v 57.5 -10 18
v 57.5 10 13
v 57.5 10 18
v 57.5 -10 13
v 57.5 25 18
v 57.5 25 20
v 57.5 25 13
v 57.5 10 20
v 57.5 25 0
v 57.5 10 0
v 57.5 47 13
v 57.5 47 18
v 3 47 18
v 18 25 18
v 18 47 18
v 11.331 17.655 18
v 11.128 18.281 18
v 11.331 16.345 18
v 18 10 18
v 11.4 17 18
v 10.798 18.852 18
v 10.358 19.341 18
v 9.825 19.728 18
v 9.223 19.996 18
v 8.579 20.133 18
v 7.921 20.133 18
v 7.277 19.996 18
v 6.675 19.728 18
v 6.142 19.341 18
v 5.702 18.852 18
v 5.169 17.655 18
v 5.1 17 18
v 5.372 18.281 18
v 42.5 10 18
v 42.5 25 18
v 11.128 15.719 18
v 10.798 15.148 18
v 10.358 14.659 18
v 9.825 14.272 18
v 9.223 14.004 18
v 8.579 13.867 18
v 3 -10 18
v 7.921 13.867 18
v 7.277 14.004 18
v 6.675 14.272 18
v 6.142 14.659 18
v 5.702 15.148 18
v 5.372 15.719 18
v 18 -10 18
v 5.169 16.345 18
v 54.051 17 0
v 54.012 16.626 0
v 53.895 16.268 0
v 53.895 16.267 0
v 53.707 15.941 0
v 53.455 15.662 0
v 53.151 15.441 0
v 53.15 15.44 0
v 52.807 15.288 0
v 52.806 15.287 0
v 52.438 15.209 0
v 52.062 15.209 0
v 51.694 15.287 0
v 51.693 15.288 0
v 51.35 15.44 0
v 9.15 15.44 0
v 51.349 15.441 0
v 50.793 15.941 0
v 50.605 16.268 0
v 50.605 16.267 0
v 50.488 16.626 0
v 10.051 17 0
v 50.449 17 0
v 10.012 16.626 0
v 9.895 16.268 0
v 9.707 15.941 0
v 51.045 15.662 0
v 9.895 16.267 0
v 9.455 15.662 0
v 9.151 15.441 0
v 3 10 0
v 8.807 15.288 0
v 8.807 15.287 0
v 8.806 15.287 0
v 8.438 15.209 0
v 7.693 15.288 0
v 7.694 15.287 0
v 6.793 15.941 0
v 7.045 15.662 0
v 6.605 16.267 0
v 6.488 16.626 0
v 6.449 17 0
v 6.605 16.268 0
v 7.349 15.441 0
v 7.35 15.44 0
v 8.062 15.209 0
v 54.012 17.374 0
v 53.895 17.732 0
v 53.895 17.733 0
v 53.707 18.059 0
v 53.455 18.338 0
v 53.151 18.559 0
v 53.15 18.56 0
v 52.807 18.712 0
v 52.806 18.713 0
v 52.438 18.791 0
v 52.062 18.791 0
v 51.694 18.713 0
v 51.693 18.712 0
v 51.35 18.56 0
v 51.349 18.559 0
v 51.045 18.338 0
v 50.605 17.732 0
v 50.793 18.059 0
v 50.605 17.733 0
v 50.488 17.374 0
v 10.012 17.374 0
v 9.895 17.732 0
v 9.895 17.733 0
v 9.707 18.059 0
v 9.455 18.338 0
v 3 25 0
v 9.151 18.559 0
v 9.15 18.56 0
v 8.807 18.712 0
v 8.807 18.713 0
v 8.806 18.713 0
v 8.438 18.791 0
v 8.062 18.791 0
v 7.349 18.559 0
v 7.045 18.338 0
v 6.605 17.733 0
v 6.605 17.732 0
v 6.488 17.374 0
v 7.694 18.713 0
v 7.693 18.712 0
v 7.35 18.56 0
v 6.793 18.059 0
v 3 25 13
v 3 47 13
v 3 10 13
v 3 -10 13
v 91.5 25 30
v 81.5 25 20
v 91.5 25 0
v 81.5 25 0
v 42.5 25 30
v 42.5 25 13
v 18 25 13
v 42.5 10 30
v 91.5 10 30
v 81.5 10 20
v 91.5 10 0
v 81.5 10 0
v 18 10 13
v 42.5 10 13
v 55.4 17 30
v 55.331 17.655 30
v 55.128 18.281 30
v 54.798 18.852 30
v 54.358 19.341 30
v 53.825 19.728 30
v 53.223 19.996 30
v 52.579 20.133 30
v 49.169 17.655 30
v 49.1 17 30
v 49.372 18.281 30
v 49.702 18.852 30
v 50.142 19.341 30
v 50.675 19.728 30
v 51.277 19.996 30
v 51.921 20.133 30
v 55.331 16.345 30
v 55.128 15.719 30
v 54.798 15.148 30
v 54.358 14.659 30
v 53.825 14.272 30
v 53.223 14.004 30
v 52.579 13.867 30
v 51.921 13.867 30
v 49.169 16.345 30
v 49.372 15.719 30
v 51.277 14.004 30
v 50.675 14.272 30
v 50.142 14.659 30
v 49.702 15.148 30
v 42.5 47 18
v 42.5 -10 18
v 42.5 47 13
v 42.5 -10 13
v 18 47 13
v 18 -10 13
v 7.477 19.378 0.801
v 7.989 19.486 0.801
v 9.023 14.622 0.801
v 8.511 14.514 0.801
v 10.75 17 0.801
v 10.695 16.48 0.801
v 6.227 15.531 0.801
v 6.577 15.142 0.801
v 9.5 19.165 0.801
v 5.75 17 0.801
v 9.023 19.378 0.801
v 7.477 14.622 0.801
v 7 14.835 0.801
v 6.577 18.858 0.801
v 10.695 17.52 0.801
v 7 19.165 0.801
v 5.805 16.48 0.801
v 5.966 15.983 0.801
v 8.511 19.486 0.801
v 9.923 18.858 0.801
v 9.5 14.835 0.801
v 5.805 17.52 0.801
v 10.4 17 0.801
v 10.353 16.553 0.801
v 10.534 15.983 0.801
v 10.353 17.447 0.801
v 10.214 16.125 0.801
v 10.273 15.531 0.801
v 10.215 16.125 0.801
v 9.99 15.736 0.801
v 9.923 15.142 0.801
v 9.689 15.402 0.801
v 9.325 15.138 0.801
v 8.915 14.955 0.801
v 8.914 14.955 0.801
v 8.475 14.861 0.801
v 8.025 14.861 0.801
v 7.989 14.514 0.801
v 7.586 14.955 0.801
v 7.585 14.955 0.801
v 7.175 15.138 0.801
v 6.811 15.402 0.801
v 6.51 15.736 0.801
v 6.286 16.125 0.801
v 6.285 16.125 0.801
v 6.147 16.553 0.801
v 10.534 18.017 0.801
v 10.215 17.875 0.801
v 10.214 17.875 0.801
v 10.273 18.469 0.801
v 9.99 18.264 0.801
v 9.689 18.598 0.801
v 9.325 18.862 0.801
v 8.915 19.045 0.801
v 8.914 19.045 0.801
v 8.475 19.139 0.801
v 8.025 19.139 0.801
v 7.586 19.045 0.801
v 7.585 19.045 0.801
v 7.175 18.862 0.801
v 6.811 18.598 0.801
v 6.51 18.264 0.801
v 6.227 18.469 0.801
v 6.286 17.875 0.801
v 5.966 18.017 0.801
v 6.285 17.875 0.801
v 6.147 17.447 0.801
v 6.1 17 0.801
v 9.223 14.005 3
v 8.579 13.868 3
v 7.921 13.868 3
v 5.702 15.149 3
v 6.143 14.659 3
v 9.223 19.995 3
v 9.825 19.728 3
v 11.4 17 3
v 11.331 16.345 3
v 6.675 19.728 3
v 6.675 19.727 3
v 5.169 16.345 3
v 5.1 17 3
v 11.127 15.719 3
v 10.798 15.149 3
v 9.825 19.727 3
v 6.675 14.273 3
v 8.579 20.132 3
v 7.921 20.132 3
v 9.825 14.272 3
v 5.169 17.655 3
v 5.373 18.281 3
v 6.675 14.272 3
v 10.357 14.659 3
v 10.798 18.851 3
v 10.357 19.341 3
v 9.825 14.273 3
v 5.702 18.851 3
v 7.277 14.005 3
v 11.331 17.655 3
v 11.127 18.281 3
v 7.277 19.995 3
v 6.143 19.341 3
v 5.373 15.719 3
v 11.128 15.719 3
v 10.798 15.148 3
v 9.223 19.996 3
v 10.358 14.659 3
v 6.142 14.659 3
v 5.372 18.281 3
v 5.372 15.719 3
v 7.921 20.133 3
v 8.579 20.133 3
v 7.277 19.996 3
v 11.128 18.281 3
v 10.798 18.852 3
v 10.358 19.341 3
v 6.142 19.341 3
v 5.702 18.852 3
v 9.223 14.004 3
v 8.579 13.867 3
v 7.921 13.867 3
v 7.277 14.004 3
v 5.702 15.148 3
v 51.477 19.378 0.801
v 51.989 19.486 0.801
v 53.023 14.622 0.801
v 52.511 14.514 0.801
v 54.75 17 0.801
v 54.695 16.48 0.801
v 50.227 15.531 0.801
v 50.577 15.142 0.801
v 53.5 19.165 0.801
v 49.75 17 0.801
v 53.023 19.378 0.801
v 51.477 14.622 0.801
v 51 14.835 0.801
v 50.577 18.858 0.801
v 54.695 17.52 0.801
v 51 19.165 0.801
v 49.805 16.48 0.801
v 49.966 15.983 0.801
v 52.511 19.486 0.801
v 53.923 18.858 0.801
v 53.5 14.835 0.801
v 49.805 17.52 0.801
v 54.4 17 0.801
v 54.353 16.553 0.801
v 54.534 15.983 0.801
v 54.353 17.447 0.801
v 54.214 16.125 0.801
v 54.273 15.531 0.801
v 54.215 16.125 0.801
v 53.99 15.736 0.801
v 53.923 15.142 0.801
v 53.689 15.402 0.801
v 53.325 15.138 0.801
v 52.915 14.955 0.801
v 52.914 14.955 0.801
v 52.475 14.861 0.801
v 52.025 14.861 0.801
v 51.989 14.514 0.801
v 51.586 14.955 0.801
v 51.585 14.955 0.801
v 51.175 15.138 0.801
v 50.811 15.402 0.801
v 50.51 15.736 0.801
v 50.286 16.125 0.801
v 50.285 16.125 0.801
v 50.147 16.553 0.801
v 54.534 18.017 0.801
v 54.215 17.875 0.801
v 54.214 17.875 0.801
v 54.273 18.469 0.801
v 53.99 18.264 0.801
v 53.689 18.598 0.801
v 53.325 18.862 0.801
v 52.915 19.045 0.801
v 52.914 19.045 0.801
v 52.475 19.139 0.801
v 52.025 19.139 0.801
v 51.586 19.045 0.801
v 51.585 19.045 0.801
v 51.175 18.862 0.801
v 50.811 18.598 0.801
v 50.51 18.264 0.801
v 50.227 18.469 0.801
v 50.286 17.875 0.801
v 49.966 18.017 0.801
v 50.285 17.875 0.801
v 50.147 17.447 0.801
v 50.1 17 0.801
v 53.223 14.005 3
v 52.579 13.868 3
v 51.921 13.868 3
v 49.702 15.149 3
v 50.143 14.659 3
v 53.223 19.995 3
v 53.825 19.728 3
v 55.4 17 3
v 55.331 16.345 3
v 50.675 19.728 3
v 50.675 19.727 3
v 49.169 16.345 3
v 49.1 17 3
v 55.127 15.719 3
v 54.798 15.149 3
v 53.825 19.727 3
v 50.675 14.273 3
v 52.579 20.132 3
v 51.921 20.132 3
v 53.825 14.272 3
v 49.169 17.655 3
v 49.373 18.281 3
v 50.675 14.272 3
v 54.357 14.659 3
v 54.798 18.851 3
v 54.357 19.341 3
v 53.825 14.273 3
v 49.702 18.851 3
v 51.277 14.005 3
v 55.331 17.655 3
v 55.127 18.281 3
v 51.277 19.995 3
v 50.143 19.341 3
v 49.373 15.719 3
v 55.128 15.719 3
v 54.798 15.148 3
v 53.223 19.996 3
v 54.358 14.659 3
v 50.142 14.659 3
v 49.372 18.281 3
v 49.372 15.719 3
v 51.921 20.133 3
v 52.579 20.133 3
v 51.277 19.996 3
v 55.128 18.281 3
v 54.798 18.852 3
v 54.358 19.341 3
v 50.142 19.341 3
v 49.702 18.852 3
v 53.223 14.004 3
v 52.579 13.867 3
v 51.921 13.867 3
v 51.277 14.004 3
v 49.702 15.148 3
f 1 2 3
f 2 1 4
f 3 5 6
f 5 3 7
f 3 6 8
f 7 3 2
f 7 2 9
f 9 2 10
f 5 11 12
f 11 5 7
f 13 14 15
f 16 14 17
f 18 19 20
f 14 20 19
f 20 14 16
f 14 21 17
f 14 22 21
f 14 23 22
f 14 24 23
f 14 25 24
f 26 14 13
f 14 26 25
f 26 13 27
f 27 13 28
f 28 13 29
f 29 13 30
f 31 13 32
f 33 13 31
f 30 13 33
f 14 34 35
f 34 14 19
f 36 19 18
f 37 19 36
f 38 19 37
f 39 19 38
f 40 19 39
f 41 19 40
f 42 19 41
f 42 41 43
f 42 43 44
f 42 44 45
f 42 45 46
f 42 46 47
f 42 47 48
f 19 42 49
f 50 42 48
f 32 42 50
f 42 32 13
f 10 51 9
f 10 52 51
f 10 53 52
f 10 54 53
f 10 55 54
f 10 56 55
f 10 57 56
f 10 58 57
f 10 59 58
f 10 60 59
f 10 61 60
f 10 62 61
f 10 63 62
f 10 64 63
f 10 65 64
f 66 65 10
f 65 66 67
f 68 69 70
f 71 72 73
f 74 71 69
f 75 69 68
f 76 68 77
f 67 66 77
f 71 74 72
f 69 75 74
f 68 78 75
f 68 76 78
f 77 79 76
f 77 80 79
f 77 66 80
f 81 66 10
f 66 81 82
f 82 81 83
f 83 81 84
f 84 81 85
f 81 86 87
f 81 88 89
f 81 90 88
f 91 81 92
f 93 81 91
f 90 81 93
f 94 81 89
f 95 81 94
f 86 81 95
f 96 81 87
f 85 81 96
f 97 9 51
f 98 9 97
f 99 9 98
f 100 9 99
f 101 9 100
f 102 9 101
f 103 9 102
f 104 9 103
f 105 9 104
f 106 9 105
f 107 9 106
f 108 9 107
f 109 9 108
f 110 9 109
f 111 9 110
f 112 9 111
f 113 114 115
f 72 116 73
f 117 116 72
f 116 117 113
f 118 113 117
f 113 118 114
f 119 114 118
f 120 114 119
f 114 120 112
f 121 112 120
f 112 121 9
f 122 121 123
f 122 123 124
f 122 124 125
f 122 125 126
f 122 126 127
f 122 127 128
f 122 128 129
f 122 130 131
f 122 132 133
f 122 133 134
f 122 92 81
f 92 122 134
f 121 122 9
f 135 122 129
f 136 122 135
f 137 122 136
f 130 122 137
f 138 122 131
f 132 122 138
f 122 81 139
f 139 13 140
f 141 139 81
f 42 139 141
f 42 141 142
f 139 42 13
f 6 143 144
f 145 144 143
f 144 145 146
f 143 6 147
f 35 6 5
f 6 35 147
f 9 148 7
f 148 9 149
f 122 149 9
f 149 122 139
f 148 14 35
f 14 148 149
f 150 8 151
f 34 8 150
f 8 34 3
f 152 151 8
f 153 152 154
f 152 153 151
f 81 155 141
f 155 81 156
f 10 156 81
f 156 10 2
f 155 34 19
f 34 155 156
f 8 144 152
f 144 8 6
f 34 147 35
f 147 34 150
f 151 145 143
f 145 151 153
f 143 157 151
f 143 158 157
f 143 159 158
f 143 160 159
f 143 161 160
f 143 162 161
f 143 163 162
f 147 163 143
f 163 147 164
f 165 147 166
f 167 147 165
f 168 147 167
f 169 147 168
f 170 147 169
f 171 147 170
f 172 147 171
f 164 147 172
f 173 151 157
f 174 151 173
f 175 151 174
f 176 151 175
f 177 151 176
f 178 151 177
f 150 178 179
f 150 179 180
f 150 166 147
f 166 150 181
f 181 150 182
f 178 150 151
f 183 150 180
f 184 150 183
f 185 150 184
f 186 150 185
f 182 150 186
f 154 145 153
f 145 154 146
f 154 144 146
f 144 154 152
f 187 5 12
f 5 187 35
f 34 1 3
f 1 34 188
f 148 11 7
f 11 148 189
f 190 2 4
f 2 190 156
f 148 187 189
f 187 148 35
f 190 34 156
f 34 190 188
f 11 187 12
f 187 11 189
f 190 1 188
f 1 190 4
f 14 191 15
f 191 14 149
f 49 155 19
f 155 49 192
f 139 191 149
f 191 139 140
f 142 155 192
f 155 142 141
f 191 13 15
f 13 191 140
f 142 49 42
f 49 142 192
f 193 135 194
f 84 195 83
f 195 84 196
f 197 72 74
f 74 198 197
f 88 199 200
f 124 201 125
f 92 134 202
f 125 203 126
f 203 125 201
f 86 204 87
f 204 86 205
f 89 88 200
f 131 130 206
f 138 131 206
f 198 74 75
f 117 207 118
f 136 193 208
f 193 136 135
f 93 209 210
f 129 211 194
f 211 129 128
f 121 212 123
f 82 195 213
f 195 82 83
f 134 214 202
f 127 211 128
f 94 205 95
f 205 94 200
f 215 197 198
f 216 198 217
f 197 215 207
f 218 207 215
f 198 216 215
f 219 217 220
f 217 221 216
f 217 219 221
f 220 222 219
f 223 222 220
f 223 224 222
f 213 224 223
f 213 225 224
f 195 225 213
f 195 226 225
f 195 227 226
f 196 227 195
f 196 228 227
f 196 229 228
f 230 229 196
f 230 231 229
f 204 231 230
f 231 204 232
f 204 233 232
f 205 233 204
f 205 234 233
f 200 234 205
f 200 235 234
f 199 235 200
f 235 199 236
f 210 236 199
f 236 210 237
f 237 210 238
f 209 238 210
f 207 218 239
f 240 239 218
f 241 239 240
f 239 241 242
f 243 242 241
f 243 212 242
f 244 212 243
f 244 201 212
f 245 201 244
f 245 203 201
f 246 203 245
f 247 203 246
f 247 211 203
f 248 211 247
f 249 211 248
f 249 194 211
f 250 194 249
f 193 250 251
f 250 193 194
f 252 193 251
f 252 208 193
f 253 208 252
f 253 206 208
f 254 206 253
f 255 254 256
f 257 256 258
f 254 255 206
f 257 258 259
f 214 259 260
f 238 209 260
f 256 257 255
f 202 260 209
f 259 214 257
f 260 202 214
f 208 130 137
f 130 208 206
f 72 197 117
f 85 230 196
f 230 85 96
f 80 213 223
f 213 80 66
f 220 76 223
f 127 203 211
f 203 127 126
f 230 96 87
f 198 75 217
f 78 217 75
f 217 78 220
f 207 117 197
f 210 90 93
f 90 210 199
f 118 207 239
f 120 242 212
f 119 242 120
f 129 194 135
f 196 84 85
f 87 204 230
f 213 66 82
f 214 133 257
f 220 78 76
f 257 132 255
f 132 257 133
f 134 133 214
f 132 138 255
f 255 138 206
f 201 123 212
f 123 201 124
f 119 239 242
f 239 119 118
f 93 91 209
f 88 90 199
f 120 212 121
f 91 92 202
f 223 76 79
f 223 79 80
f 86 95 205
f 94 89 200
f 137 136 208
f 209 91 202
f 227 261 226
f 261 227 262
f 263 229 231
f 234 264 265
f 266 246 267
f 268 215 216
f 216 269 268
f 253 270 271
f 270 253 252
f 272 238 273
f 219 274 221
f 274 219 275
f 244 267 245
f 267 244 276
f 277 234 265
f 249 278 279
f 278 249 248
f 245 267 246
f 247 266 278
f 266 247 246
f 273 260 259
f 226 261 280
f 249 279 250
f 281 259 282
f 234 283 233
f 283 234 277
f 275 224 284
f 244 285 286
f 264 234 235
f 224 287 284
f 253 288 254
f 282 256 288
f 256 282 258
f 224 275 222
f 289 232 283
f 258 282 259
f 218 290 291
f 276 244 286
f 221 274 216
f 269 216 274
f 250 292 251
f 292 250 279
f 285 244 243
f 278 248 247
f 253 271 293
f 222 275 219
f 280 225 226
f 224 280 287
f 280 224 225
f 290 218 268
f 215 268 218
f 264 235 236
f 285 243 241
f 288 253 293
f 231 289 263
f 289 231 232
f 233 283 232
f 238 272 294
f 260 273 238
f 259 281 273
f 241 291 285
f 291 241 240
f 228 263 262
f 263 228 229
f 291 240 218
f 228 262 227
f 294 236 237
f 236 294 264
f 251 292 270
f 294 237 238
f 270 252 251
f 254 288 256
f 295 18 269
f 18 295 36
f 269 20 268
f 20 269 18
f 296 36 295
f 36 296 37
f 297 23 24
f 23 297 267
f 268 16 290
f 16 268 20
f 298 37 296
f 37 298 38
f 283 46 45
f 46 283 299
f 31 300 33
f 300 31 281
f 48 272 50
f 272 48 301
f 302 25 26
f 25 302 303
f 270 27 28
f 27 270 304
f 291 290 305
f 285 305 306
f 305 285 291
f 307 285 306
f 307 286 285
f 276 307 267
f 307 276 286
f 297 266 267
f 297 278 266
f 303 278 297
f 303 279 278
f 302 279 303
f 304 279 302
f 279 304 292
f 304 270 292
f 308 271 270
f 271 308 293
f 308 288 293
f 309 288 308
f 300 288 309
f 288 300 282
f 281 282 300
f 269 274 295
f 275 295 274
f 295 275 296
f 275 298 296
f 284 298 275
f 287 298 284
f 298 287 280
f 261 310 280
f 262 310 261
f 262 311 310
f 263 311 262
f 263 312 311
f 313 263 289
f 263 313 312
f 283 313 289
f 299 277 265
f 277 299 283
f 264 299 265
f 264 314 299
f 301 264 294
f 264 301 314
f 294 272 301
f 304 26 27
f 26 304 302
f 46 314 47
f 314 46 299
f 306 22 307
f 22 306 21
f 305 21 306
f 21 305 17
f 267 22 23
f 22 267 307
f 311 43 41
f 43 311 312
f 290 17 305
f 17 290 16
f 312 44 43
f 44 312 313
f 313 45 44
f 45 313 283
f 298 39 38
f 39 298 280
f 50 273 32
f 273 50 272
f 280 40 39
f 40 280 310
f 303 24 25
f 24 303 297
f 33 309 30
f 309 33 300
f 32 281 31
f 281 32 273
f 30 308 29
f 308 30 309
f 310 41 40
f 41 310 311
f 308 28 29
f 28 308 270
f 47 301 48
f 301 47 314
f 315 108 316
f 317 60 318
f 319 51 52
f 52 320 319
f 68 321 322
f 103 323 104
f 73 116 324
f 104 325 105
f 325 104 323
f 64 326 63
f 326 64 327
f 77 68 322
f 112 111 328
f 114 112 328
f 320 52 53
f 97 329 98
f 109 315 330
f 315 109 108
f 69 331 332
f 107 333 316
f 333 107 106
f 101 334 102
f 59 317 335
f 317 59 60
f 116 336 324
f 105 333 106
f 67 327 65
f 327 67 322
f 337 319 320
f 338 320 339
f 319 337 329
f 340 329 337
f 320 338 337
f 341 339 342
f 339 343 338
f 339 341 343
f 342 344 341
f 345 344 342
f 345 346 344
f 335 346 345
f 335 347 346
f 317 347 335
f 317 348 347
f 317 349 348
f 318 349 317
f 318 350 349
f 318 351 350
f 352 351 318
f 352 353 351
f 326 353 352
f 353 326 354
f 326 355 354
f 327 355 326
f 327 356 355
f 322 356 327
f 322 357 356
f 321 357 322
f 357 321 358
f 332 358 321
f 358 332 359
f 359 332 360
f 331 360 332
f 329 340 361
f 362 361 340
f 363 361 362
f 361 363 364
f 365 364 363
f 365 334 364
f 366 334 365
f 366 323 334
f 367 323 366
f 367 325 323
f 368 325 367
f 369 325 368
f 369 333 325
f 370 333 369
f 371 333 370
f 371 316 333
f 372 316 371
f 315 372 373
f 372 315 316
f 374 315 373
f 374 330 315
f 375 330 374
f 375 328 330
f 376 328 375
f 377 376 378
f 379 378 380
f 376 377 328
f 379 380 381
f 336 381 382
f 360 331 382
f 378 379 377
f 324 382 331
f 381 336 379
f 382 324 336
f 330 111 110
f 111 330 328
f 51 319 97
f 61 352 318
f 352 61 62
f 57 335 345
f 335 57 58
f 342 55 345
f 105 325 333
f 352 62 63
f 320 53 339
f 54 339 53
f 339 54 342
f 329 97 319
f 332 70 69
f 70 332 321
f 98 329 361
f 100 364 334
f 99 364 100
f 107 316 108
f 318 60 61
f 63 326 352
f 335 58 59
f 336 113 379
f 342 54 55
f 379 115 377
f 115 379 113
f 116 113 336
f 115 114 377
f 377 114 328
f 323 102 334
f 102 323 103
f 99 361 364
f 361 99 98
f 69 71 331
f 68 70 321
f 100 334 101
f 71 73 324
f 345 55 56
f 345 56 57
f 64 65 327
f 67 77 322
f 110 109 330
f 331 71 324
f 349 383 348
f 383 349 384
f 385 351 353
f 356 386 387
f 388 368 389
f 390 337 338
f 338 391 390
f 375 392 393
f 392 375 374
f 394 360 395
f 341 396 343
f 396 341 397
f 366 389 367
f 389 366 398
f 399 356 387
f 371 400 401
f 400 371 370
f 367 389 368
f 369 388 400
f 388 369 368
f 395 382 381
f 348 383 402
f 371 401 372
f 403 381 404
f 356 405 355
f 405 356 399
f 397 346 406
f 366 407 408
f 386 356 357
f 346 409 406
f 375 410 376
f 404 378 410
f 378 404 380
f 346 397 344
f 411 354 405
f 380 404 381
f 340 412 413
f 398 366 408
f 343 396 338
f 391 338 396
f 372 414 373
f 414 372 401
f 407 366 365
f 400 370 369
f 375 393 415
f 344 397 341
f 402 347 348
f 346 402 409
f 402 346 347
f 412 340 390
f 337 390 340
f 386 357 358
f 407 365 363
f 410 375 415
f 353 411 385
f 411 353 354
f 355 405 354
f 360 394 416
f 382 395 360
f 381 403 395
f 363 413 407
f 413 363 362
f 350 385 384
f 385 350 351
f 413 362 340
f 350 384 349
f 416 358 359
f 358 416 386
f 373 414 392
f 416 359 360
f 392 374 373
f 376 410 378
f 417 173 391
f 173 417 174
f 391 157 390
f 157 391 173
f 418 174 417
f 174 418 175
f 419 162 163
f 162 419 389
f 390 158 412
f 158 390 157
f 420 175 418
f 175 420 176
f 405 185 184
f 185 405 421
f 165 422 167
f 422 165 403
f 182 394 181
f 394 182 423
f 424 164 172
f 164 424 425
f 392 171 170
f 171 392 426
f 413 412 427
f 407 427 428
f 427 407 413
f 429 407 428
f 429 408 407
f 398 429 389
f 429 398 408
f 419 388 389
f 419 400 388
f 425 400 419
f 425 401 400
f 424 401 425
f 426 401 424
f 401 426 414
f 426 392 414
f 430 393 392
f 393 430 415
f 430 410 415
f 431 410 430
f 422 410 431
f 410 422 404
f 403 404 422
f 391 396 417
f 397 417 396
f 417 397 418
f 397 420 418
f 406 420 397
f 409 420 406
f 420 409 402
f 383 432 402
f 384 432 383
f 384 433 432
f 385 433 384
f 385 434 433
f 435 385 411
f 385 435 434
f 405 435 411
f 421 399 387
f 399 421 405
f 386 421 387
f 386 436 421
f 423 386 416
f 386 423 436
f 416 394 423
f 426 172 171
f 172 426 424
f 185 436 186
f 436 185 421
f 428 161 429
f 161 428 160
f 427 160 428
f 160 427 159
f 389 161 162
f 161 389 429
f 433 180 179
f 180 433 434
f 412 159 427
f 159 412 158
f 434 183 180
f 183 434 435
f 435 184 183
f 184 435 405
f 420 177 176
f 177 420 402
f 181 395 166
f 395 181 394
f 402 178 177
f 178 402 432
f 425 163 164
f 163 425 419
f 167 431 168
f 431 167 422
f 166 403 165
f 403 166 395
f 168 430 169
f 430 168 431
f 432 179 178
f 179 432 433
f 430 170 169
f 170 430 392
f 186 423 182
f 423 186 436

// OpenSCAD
//
// ktCURTAIN1
//
//


gap1 = 0.001;
gap2 = 0.002;

th = 2;
//for A
h = 6.5 + 0.5;
r = (26+0.6)/2;
rr = r + 4/2;
rh = 8/2;

//A();
//B();
//C1();
C2();
//D1();
//D2();

module A()
difference()
{
    union()
    {
        translate([0, 0, h+th/2]) rotate([0, 0, 0,]) cylinder(th/2,  r+rh, r+rh, $fn=100);
        translate([0, 0, h]) rotate([0, 0, 0,]) cylinder(th/2,  r+rh-2.2, r+rh, $fn=100);
        translate([0, 0, 0]) rotate([0, 0, 0,]) cylinder(h,  rr, rr, $fn=100);
        translate([0, 0, -th/2]) rotate([0, 0, 0,]) cylinder(th/2,  r+rh, r+rh-2.2, $fn=100);
        translate([0, 0, -th]) rotate([0, 0, 0,]) cylinder(th/2,  r+rh, r+rh, $fn=100);
    }

    translate([0, 0, -10]) rotate([0, 0, 0,]) cylinder(30, r, r, $fn=100);

    for (i =[0:(360/48):360])
    {
        rotate([0, 0, i,]) translate([r+2, 0, -gap1]) scale([1.4, 1, 1]) cylinder(h+gap2, 1, 1, $fn=4);
    }
}

module B()
difference()
{
    union()
    {
        translate([0, 0, 0])
        rotate([0, 0, 0])
        hull()
        {
            translate([0, 0, 10])
            minkowski()
            {
                cube([60.5-1*2, 23-1*2, gap1], center=true);
                cylinder(r=1, h=gap1, $fn=50);
            }
            minkowski()
            {
                cube([59-1*2, 19.7-1*2, gap1], center=true);
                cylinder(r=1, h=gap1, $fn=50);
            }
        }
        translate([-1, 0, 0])
        rotate([0, 0, 0])
        hull()
        {
            translate([0, 0, 10])
            cube([17.5,  32.5, gap1], center=true);
            cube([17.5,  29.5, gap1], center=true);
        }
    }
    translate([-40, 16-16.5, -7]) rotate([90, 0, 0]) cylinder(17,  r+rh, r+rh, $fn=100);
    
    translate([-22, -7, 10]) rotate([180, 0, 0]) rear_screw_hole();
    translate([22, -7, 10]) rotate([180, 0, 0]) rear_screw_hole();
}

module C()
difference()
{
    union()
    {
        translate([0, 0, 0])
        rotate([0, 0, 0])
        hull()
        {
            translate([0, 0, 10])
            minkowski()
            {
                cube([60.5-1*2, 23-1*2, gap1], center=true);
                cylinder(r=1, h=gap1, $fn=50);
            }
            minkowski()
            {
                cube([59-1*2, 19.7-1*2, gap1], center=true);
                cylinder(r=1, h=gap1, $fn=50);
            }
        }
        translate([-1, 0, 0])
        rotate([0, 0, 0])
        hull()
        {
            translate([0, 0, 10])
            cube([17.5,  32.5, gap1], center=true);
            cube([17.5,  29.5, gap1], center=true);
        }
    }
    
    translate([-40, 16, -7]) rotate([90, 0, 0]) cylinder(17,  r+rh, r+rh, $fn=100);
    
    //translate([-22, 7, 10]) rotate([180, 0, 0]) rear_screw_hole();
    //translate([22, 7, 10]) rotate([180, 0, 0]) rear_screw_hole();
}

module C1()
{
difference()
{
    union()
    {
        translate([60.5/2, 10, -10-3]) C();
        translate([0, 0, -3]) cube([60.5+21, 37, 3]);
        translate([0, -7, -3]) cube([20, 7, 3]);
        translate([40.5, -7, -3]) cube([20, 7, 3]);
        translate([0, 37, -3]) cube([20, 7, 3]);
        translate([40.5, 37, -3]) cube([20, 7, 3]);
        translate([0, 0, 0]) cube([60.5, 37, 12]);
        translate([60.5, 0, 0]) cube([21+10, 37, 12]);
        translate([60.5+21, 0, -3]) cube([10, 37, 23]);
    }
    translate([3-0.5, 10-0.5, 0-gap1]) cube([60.5-3*2+1+40, 15+1, 30]);
    translate([60.5, -10, 12-1-2-4]) cube([15+6, 37+20, 10]);
    translate([60.5+21-5+gap1, 0-gap1, -10]) cube([10+5, 3, 40]);
    translate([60.5+21-5+gap1, 37-3+gap1, -10]) cube([10+5, 3, 40]);
    translate([60.5, 10-0.5, -10]) cube([21, 15+1, 30]);
    translate([60.5+21-gap1, 10-0.5, -1]) cube([10+gap2, 15+1, 30]);
    
    translate([60.5/2, 10, -10])
    {
        translate([-22, 7, 10+3]) rotate([180, 0, 0]) rear_screw_hole();
        translate([22, 7, 10+3]) rotate([180, 0, 0]) rear_screw_hole();
    }
    
    translate([60.5-15-3-1, -10, 12-1-2]) cube([15+2, 37+20, 5]);
    translate([3-1, -10, 12-1-2]) cube([15+2, 37+20, 5]);
}
translate([60.5+21, 3, -3]) cube([10, 37-6, 2]);
}

module C2()
difference()
{
    union()
    {
        translate([3, 10, 0]) cube([60.5-3*2, 15, 16-1+3]);
        translate([60.5-15-3, 10, 0]) cube([15, 15, 20]);
        translate([60.5-25+10-3, 10, 20]) cube([21+25+3, 15, 10]);
        translate([60.5+21, 10, 0]) cube([10, 15, 20]);
        translate([60.5-15-3, -10, 12-1-1+3]) cube([15, 37+20, 5]);
        
        translate([3, 10, 0]) cube([15, 15, 15]);
        translate([3, -10, 12-1-1+3]) cube([15, 37+20, 5]);
    }
    
    translate([60.5/2, 10, -10])
    {
        translate([-22, 7, 10+3]) rotate([180, 0, 0]) rear_screw_hole();
        translate([22, 7, 10+3]) rotate([180, 0, 0]) rear_screw_hole();
    }
}

module D1()
{
difference()
{
    union()
    {
        //translate([60.5/2, 10, -10-3]) C();
        translate([0, 0, -3]) cube([60.5+21, 37, 3]);
        translate([0, -7, -3]) cube([20, 7, 3]);
        translate([40.5, -7, -3]) cube([20, 7, 3]);
        translate([0, 37, -3]) cube([20, 7, 3]);
        translate([40.5, 37, -3]) cube([20, 7, 3]);
        translate([0, 0, 0]) cube([60.5, 37, 12]);
        translate([60.5, 0, 0]) cube([21+10, 37, 12]);
        translate([60.5+21, 0, -3]) cube([10, 37, 23]);
    }
    translate([3-0.5, 10-0.5, 0-gap1]) cube([60.5-3*2+1+40, 15+1, 30]);
    translate([60.5, -10, 12-1-2-4]) cube([15+6, 37+20, 10]);
    translate([60.5+21-5+gap1, 0-gap1, -10]) cube([10+5, 3, 40]);
    translate([60.5+21-5+gap1, 37-3+gap1, -10]) cube([10+5, 3, 40]);
    translate([60.5, 10-0.5, -10]) cube([21, 15+1, 30]);
    translate([60.5+21-gap1, 10-0.5, -1]) cube([10+gap2, 15+1, 30]);
    
    translate([60.5/2, 10, -10])
    {
        translate([-22, 7, 10+3]) rotate([180, 0, 0]) rear_screw_hole();
        translate([22, 7, 10+3]) rotate([180, 0, 0]) rear_screw_hole();
    }
    
    translate([60.5-15-3-1, -10, 12-1-2]) cube([15+2, 37+20, 5]);
    translate([3-1, -10, 12-1-2]) cube([15+2, 37+20, 5]);
    
    translate([0, -20, -20]) cube([40, 100, 50]);
    translate([60.5/2, 10, -13])
    {
        translate([22, 7, 10+3]) rotate([180, 0, 0]) screw_hole();
    }

}
translate([60.5+21, 3, -3]) cube([10, 37-6, 2]);
translate([60.5, 6, 0]) D1B();
}
module D1B()
{
difference()
{
    union()
    {
        translate([0-5, 15-8-4, -27]) cube([28.5+5, 24, 26]);
    }
    translate([22, 15-5, -21]) rotate([-90, 0, 0]) cylinder(10, 11, 11, $fn=30);
    translate([0-21, 15-5, -31]) cube([56, 10, 21]);
    
    translate([22, 0, -21]) rotate([-90, 0, 0]) cylinder(30, 5/2+1/2, 5/2+1/2, $fn=30);
    
    translate([22, 25, -21]) rotate([-90, 0, 0]) cylinder(5, 5, 5, $fn=6);
}
}

module D2()
difference()
{
    union()
    {
        translate([3, 10, 0]) cube([60.5-3*2, 15, 16-1]);
        translate([60.5-15-3, 10, 0]) cube([15, 15, 20]);
        translate([60.5-25+10-3, 10, 20]) cube([21+25+3, 15, 10]);
        translate([60.5+21, 10, 0]) cube([10, 15, 20]);
        translate([60.5-15-3, -10, 12-1-1]) cube([15, 37+20, 5]);
        
        translate([3, 10, 0]) cube([15, 15, 15]);
        translate([3, -10, 12-1-1]) cube([15, 37+20, 5]);
    }
    
    translate([60.5/2, 10, -10])
    {
        translate([-22, 7, 10+3]) rotate([180, 0, 0]) rear_screw_hole();
        translate([22, 7, 10+3]) rotate([180, 0, 0]) rear_screw_hole();
    }
    
    translate([0, -20, -20]) cube([40, 100, 50]);
}

module screw_hole()
{
    cylinder( 10, 1.6, 1.6, $fn=30 );
    translate( [0, 0, 1.5] ) cylinder( 10, 6.5/2+0.1, 6.5/2+0.1, $fn=6 );
}
module screw_hole2()
{
    translate([0, 0, -5]) cylinder( 20, 1.6, 1.6, $fn=30 );
    translate( [0, 0, 1.5] ) cylinder( 3, 6.5/2+0.1, 6.5/2+0.1, $fn=6 );
}
module rear_screw_hole()
{
    translate([0, 0, 3]) cylinder(15, 1.8, 1.8, $fn=30);
    translate([0, 0, 2.2-gap1]) cylinder(0.8+gap2, 1.8+0.7, 1.8, $fn=30);
    translate([0, 0, -gap1]) cylinder(2.2+gap1, 2.75+0.4, 2.75-0.6, $fn=30);
    translate([0, 0, -30]) cylinder(30, 2.75+0.4, 2.75+0.4, $fn=30);
}
